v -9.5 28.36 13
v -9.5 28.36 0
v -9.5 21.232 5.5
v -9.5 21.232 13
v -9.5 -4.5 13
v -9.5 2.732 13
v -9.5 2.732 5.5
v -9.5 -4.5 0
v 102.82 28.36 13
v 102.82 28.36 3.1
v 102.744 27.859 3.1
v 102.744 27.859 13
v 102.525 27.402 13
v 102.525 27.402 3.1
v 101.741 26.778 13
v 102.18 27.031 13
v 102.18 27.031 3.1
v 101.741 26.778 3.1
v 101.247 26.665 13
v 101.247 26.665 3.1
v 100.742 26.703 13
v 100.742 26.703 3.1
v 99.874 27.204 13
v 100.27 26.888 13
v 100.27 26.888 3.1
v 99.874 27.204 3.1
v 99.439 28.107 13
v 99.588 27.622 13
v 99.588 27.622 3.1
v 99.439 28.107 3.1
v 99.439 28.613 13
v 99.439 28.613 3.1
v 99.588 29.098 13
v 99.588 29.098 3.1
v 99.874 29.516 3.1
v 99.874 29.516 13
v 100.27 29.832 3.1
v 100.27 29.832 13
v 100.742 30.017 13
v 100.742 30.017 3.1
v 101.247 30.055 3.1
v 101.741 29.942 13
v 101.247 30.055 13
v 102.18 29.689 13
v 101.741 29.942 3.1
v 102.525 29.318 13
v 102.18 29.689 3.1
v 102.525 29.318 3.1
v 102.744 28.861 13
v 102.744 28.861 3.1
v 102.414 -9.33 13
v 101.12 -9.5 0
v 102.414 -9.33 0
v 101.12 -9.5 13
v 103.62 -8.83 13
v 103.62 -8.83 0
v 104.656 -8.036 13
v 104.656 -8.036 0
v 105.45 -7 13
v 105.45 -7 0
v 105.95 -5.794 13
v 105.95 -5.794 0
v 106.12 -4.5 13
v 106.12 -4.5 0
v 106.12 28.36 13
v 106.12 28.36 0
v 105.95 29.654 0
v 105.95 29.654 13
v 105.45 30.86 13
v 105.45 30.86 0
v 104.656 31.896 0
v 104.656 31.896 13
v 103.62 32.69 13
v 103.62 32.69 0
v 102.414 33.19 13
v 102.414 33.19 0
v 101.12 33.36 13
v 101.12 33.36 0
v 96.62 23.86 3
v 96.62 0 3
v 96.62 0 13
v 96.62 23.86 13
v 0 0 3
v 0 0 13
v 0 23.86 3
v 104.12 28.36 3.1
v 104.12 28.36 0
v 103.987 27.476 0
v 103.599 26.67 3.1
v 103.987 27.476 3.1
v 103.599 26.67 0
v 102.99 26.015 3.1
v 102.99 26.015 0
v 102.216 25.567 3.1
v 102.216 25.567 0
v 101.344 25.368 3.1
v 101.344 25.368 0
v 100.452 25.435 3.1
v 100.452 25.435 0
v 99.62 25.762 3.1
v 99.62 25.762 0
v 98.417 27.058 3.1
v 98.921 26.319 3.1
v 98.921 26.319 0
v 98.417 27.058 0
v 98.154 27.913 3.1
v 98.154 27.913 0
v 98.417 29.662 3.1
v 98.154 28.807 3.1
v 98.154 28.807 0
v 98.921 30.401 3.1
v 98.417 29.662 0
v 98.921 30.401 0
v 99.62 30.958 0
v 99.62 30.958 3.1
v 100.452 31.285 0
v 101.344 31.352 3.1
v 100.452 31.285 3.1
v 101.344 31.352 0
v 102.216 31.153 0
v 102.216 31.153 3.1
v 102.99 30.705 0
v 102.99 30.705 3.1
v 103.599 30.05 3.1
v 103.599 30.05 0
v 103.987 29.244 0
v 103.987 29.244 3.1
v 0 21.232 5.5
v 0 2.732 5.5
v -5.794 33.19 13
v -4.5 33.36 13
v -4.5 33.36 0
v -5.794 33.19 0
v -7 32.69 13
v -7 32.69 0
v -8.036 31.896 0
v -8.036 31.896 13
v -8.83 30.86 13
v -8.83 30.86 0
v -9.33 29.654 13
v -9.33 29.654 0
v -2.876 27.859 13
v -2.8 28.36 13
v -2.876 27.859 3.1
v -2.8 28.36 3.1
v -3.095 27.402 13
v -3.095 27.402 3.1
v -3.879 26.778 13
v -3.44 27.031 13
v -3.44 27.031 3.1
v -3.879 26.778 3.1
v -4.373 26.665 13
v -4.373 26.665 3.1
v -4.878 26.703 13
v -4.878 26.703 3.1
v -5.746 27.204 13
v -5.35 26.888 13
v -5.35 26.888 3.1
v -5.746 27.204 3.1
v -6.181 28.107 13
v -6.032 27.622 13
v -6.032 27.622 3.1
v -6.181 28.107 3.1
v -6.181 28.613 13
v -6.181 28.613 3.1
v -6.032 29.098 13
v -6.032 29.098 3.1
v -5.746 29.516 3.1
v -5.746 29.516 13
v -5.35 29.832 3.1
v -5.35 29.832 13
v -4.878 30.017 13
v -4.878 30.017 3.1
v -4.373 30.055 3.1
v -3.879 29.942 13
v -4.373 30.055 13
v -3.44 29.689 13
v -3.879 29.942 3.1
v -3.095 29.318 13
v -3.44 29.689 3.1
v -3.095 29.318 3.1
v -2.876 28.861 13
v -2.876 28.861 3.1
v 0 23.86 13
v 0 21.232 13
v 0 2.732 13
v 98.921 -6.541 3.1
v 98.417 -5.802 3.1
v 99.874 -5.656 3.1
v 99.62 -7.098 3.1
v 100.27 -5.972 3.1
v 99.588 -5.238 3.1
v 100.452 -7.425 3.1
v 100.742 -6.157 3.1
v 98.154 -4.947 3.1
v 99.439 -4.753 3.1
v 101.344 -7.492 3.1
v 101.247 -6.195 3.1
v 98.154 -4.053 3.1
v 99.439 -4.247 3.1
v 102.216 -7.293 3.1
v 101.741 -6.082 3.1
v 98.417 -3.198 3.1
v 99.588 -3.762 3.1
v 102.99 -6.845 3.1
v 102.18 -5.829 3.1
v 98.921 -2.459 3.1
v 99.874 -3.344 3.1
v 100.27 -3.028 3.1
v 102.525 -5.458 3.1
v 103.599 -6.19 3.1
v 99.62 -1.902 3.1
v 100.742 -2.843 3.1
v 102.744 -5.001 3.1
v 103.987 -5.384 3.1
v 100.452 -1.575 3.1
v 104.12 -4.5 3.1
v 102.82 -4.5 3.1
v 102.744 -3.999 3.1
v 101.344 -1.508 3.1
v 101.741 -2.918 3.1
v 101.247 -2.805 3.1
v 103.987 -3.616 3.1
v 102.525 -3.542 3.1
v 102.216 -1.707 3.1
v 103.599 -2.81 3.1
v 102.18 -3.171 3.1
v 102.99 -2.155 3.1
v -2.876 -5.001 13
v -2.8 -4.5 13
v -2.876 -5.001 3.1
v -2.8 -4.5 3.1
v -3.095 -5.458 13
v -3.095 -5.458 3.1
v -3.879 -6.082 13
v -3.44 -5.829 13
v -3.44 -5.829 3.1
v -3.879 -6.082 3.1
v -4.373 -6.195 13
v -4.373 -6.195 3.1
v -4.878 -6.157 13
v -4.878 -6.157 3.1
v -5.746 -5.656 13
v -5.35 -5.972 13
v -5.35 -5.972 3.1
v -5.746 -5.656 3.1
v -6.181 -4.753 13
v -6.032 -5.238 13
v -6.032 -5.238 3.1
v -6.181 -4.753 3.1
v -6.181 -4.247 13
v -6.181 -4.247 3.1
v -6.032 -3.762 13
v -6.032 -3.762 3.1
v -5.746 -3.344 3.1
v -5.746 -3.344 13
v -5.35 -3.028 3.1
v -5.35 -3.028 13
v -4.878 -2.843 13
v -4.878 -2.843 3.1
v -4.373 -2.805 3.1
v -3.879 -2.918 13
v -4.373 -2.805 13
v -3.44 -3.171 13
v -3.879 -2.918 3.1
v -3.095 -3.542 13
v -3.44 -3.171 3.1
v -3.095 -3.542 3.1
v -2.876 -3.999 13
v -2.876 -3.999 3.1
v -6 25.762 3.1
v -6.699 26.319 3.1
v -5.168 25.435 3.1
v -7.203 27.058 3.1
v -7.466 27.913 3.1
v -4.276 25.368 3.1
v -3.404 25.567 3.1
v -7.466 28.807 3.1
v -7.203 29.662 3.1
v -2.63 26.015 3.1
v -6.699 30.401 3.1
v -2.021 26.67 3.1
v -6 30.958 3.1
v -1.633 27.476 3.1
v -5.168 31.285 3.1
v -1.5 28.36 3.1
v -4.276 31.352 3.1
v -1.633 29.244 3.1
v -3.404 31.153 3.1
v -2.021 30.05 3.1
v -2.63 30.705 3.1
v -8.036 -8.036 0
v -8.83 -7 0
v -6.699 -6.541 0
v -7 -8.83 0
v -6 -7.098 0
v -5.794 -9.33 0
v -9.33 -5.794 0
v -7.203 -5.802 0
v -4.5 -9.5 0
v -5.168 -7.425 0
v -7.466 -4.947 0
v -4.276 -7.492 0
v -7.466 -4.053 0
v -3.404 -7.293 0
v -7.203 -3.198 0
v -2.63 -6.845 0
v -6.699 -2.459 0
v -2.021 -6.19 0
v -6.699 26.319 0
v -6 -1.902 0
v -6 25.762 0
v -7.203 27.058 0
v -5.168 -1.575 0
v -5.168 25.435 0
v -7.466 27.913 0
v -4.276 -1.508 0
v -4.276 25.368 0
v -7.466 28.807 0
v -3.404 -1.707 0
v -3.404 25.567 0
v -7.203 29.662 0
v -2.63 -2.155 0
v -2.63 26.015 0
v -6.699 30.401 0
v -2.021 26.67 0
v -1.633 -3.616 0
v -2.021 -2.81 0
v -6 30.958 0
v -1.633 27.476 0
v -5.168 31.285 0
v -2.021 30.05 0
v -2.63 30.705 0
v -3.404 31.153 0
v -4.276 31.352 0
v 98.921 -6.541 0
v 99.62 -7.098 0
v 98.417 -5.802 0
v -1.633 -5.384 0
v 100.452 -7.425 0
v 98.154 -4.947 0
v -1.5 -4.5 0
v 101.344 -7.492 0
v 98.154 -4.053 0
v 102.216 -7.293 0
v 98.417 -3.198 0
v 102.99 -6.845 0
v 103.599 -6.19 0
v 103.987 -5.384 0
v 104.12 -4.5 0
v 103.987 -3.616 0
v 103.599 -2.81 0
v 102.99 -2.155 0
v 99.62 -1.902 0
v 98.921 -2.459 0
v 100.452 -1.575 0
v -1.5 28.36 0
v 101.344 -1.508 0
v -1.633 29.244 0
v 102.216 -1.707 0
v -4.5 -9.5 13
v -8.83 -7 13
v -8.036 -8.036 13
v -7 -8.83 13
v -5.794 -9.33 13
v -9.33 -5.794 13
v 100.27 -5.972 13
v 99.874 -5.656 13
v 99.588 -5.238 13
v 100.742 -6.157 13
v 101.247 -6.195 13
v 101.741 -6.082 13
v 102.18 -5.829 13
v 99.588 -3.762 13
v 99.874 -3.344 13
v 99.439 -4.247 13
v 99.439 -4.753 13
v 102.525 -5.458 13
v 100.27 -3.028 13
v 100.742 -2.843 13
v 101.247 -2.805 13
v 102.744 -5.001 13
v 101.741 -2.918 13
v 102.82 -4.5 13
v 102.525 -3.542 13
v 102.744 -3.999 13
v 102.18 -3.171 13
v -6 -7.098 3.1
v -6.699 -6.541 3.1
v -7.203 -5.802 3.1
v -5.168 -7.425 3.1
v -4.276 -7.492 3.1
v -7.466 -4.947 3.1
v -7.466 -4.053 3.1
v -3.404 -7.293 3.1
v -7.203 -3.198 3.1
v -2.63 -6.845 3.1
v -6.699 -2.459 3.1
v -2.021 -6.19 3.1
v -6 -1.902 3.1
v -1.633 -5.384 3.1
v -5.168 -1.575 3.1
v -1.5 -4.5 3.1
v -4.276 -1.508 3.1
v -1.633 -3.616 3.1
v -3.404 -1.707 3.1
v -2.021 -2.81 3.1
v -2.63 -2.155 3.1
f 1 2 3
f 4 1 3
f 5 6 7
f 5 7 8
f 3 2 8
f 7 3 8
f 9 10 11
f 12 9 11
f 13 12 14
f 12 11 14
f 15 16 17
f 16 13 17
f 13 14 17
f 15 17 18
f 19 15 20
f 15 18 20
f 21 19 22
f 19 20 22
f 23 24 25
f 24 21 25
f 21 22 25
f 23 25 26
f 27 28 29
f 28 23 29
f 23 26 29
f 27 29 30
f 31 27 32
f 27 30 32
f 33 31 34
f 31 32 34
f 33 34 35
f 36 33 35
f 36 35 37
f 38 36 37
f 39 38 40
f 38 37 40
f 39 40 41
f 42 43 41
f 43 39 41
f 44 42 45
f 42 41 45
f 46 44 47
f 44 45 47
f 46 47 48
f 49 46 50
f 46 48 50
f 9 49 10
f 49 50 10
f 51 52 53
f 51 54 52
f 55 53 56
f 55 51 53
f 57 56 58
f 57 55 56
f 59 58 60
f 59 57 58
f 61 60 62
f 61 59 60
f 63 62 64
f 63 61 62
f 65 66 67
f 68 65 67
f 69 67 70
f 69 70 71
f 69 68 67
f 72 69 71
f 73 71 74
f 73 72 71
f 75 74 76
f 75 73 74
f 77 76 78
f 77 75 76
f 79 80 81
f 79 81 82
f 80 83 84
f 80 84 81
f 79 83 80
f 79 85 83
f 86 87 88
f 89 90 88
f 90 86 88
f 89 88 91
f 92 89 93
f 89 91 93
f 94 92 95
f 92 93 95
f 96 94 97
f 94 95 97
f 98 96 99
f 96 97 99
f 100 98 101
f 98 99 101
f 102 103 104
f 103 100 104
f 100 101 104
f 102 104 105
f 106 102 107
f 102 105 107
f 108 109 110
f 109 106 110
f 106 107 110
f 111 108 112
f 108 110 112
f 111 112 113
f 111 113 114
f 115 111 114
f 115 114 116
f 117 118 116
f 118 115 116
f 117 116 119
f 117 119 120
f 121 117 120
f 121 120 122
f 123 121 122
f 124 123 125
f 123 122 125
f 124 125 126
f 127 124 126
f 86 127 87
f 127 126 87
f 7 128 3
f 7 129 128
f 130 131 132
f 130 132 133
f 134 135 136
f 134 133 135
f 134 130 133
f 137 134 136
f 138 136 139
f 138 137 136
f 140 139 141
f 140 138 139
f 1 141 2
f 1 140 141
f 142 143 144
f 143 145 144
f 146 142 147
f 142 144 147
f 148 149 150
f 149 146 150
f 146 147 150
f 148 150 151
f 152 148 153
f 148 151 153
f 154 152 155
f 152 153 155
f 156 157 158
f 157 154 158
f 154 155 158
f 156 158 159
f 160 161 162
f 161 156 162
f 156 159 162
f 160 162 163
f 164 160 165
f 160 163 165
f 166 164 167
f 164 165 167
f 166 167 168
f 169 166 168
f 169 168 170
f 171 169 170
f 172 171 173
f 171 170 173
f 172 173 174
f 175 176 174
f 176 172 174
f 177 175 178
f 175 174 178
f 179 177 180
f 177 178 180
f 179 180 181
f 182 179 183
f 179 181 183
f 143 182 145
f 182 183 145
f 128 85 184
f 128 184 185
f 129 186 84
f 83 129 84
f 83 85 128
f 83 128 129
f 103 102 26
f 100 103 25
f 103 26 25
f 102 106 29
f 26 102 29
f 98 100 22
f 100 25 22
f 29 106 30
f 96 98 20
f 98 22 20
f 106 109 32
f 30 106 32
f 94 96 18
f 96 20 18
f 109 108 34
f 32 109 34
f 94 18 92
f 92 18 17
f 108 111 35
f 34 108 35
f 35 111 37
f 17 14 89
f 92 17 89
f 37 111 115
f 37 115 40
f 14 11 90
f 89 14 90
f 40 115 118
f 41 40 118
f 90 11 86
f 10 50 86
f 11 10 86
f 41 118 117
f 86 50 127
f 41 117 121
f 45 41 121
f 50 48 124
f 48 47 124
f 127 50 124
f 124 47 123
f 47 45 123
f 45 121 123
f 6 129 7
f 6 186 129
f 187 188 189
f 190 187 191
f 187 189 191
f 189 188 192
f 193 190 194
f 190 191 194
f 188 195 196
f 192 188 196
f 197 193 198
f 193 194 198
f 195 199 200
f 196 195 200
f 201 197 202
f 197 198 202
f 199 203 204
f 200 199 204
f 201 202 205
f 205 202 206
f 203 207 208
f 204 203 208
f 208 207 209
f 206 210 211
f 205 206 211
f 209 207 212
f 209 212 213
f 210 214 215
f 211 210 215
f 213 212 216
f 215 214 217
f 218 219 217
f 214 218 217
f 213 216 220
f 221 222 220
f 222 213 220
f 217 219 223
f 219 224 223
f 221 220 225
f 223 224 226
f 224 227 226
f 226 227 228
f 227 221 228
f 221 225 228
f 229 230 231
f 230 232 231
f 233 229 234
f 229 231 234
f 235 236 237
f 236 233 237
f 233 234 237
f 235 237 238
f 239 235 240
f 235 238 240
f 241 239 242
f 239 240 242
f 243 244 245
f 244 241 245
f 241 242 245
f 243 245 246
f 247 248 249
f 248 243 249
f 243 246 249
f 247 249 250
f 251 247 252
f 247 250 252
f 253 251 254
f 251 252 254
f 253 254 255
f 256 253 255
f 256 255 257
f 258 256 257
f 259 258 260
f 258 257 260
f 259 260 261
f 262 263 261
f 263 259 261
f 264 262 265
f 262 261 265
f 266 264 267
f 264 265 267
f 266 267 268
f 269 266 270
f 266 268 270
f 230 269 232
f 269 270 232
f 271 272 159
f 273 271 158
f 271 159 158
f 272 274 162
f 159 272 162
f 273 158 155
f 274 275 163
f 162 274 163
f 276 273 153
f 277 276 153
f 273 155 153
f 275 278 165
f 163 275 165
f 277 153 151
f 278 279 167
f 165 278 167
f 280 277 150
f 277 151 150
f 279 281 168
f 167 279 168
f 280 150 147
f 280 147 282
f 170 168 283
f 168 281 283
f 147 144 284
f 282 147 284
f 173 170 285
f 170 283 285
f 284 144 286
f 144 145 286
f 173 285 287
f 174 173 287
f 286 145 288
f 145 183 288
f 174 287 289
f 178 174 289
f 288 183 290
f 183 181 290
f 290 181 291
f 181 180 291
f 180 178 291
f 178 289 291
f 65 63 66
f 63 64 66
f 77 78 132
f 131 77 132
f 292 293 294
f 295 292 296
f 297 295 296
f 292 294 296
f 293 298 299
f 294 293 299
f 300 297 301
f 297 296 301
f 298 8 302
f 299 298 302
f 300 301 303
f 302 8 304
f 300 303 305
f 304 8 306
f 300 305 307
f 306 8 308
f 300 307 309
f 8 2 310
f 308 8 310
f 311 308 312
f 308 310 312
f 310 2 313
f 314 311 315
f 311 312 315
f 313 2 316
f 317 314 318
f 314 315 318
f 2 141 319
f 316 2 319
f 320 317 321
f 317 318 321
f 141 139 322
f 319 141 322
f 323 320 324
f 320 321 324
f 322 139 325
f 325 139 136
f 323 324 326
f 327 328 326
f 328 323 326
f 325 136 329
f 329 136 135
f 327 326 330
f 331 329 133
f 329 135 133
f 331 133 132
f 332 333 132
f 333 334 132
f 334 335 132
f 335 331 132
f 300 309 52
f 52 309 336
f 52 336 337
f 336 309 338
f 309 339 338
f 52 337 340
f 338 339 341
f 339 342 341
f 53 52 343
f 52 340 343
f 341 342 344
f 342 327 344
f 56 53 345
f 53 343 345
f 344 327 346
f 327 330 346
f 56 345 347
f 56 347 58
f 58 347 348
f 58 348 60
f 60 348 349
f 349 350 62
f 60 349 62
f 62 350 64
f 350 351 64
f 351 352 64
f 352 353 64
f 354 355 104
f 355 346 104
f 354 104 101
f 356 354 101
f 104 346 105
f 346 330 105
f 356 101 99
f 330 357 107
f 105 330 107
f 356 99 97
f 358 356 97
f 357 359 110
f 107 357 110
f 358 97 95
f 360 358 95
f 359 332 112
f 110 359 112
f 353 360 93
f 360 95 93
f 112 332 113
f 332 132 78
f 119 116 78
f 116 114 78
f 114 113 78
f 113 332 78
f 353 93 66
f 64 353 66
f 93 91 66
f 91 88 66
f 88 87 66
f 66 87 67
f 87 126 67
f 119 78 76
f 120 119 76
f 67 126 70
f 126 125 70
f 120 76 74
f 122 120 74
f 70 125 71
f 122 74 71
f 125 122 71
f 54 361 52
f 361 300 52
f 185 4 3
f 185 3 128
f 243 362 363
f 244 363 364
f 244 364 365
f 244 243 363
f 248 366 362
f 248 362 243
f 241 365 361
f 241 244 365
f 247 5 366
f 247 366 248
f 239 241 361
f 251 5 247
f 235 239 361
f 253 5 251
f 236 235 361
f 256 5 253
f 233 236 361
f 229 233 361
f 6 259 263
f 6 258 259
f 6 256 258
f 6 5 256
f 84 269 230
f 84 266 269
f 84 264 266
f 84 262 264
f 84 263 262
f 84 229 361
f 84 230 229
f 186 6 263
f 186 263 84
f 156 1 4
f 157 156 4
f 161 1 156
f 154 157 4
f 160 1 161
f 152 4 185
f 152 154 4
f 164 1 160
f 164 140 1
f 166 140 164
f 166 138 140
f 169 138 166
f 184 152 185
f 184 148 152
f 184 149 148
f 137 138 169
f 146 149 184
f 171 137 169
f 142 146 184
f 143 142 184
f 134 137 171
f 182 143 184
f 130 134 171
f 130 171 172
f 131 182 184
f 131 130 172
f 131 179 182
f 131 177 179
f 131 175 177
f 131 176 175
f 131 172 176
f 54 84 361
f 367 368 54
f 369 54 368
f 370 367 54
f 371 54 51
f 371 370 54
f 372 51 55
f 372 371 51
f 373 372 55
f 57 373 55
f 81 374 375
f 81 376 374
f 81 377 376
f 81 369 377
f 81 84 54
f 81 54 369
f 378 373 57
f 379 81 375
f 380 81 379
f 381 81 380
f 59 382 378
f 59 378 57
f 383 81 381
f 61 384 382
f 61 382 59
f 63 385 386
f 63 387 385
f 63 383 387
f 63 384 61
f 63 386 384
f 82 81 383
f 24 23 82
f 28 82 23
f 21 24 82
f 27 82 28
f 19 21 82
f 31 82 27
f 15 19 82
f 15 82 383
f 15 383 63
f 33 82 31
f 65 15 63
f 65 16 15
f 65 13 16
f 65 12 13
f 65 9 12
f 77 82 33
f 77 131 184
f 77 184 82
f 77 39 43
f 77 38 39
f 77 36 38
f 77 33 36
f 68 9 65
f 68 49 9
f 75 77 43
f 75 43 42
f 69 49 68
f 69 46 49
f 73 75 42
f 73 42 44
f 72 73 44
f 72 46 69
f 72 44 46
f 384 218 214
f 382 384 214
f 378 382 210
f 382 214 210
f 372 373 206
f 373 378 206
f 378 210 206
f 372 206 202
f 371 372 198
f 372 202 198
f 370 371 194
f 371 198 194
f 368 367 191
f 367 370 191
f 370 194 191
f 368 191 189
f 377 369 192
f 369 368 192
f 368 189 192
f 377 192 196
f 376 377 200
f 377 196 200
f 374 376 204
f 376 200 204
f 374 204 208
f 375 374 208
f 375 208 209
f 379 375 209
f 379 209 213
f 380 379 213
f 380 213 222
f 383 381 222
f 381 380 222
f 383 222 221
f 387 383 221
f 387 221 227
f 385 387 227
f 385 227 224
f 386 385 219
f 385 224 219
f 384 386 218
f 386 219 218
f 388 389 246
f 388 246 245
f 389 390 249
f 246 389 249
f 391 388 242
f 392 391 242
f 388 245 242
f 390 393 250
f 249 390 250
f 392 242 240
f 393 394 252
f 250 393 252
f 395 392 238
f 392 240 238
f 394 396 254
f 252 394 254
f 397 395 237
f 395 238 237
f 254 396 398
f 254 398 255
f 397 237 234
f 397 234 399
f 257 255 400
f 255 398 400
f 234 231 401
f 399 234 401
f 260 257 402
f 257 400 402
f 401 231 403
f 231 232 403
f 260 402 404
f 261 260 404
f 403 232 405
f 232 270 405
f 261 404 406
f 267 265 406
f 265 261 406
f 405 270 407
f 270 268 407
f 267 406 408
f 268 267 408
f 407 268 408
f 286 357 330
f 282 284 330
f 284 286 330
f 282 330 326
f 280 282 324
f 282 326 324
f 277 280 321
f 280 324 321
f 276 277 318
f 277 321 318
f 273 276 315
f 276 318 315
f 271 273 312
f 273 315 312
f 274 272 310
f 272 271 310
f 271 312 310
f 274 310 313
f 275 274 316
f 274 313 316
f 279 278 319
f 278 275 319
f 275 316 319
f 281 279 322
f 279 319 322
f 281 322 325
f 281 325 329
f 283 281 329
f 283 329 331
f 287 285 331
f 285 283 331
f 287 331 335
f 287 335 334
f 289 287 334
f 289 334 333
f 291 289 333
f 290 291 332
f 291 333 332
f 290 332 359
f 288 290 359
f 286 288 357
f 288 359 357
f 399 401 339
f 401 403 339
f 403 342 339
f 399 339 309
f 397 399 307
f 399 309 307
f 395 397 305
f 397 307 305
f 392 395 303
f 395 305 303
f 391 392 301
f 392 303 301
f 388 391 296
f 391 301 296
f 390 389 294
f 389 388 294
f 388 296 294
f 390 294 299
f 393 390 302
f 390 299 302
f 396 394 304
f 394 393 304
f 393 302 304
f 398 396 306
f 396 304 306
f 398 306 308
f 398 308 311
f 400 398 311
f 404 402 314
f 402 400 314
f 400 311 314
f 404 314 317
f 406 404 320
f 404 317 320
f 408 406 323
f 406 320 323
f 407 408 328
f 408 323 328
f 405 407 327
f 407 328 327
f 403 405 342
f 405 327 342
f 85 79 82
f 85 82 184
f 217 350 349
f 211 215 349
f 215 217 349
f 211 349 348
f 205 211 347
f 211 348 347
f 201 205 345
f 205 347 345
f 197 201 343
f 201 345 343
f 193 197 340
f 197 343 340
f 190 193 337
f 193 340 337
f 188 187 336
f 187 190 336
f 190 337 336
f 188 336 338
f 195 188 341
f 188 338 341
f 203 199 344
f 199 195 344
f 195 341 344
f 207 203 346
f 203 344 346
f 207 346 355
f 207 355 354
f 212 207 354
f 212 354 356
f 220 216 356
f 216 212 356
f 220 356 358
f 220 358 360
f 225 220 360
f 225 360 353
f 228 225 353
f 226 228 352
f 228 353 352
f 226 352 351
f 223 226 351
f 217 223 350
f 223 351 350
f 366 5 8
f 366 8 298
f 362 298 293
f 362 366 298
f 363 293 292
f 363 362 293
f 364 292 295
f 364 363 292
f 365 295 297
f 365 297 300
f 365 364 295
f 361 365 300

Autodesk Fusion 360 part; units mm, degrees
sketch "Sketch1" plane through (0, 0, 0) normal (0, 0, 1) x (1, 0, 0) in component "WeCopy"
  line L0 (0, 0) -> (96.62, 0)
  line L1 (96.62, 0) -> (96.62, 23.86)
  line L2 (96.62, 23.86) -> (0, 23.86)
  line L3 (0, 23.86) -> (0, 0)
  line L4 (-9.5, -9.5) -> (106.12, -9.5)
  line L5 (106.12, -9.5) -> (106.12, 33.36)
  line L6 (106.12, 33.36) -> (-9.5, 33.36)
  line L7 (-9.5, 33.36) -> (-9.5, -9.5)
  circle A0 centre (101.12, 28.36) radius 1.7
  circle A1 centre (101.12, -4.5) radius 1.7
  circle A2 centre (-4.5, 28.36) radius 1.7
  circle A3 centre (-4.5, -4.5) radius 1.7
  circle A4 centre (101.12, 28.36) radius 3
  circle A5 centre (101.12, -4.5) radius 3
  circle A6 centre (-4.5, -4.5) radius 3
  circle A7 centre (-4.5, 28.36) radius 3
  dimension "d1" = 96.62
  dimension "d2" = 23.86
  dimension "d3" = 115.62
  dimension "d4" = 42.86
  dimension "d5" = 9.5
  dimension "d6" = 9.5
  dimension "d7" = 9.5
  dimension "d8" = 9.5
  dimension "d9" = 3.4
  dimension "d10" = 3.4
  dimension "d11" = 3.4
  dimension "d12" = 3.4
  dimension "d13" = 5
  dimension "d14" = 5
  dimension "d15" = 5
  dimension "d16" = 5
  dimension "d17" = 5
  dimension "d18" = 5
  dimension "d19" = 5
  dimension "d20" = 5
  dimension "d21" = 6
  dimension "d22" = 6
  dimension "d23" = 6
  dimension "d24" = 6
extrude "Extrude2" add sketch "Sketch1" along normal blind 9.9 from surface at 3.1 contours A4 | A5 | A6 | A7 makes body 1 at (99.7514, 25.6904, 6.4) makes body 2 at (-1.5037, -4.6495, 9.7) makes body 3 at (101.9325, -1.6121, 9.7) makes body 4 at (-1.5037, 28.2105, 9.7) in component "WeCopy"
extrude "Extrude3" add sketch "Sketch1" along normal blind 13 contours L4 L5 L6 L7 bodies 1 2 3 4 in component "WeCopy"
extrude "Extrude4" add sketch "Sketch1" along normal blind 3 contours L0 L1 L2 L3 bodies 1 in component "WeCopy"
sketch "Sketch2" plane through (0, 0, 3) normal (0, 0, 1) x (-1, 0, 0) in component "WeCopy"
  line L0 (0, -23.86) -> (0, 0)
  line L1 (0, 0) -> (-96.62, 0)
  line L2 (-96.62, 0) -> (-96.62, -23.86)
  line L3 (-96.62, -23.86) -> (0, -23.86)
  line L4 (14, -21.2325) -> (-4.5, -21.2325)
  line L5 (-4.5, -21.2325) -> (-4.5, -2.7325)
  line L6 (-4.5, -2.7325) -> (14, -2.7325)
  line L7 (14, -2.7325) -> (14, -21.2325)
  line L8 (9.5, 9.5) -> (-106.12, 9.5)
  dimension "d35" = 18.5
  dimension "d36" = 18.5
  dimension "d37" = 12.2325
extrude "Extrude5" cut sketch "Sketch2" against normal blind 7.5 from surface at 10 contours L0 L4 L6 L7 bodies 1 in component "WeCopy"
fillet "Fillet1" radius 5 1 edges at (-9.5, 33.36, 6.5) on bodies 1 in component "WeCopy"
fillet "Fillet2" radius 5 1 edges at (-9.5, -9.5, 6.5) on bodies 1 in component "WeCopy"
fillet "Fillet3" radius 5 1 edges at (106.12, -9.5, 6.5) on bodies 1 in component "WeCopy"
fillet "Fillet4" radius 5 1 edges at (106.12, 33.36, 6.5) on bodies 1 in component "WeCopy"
component "WeCopy" placed x (1, 0, 0) y (0, 1, 0) z (0, 0, 1) at (0, 0, 0)
